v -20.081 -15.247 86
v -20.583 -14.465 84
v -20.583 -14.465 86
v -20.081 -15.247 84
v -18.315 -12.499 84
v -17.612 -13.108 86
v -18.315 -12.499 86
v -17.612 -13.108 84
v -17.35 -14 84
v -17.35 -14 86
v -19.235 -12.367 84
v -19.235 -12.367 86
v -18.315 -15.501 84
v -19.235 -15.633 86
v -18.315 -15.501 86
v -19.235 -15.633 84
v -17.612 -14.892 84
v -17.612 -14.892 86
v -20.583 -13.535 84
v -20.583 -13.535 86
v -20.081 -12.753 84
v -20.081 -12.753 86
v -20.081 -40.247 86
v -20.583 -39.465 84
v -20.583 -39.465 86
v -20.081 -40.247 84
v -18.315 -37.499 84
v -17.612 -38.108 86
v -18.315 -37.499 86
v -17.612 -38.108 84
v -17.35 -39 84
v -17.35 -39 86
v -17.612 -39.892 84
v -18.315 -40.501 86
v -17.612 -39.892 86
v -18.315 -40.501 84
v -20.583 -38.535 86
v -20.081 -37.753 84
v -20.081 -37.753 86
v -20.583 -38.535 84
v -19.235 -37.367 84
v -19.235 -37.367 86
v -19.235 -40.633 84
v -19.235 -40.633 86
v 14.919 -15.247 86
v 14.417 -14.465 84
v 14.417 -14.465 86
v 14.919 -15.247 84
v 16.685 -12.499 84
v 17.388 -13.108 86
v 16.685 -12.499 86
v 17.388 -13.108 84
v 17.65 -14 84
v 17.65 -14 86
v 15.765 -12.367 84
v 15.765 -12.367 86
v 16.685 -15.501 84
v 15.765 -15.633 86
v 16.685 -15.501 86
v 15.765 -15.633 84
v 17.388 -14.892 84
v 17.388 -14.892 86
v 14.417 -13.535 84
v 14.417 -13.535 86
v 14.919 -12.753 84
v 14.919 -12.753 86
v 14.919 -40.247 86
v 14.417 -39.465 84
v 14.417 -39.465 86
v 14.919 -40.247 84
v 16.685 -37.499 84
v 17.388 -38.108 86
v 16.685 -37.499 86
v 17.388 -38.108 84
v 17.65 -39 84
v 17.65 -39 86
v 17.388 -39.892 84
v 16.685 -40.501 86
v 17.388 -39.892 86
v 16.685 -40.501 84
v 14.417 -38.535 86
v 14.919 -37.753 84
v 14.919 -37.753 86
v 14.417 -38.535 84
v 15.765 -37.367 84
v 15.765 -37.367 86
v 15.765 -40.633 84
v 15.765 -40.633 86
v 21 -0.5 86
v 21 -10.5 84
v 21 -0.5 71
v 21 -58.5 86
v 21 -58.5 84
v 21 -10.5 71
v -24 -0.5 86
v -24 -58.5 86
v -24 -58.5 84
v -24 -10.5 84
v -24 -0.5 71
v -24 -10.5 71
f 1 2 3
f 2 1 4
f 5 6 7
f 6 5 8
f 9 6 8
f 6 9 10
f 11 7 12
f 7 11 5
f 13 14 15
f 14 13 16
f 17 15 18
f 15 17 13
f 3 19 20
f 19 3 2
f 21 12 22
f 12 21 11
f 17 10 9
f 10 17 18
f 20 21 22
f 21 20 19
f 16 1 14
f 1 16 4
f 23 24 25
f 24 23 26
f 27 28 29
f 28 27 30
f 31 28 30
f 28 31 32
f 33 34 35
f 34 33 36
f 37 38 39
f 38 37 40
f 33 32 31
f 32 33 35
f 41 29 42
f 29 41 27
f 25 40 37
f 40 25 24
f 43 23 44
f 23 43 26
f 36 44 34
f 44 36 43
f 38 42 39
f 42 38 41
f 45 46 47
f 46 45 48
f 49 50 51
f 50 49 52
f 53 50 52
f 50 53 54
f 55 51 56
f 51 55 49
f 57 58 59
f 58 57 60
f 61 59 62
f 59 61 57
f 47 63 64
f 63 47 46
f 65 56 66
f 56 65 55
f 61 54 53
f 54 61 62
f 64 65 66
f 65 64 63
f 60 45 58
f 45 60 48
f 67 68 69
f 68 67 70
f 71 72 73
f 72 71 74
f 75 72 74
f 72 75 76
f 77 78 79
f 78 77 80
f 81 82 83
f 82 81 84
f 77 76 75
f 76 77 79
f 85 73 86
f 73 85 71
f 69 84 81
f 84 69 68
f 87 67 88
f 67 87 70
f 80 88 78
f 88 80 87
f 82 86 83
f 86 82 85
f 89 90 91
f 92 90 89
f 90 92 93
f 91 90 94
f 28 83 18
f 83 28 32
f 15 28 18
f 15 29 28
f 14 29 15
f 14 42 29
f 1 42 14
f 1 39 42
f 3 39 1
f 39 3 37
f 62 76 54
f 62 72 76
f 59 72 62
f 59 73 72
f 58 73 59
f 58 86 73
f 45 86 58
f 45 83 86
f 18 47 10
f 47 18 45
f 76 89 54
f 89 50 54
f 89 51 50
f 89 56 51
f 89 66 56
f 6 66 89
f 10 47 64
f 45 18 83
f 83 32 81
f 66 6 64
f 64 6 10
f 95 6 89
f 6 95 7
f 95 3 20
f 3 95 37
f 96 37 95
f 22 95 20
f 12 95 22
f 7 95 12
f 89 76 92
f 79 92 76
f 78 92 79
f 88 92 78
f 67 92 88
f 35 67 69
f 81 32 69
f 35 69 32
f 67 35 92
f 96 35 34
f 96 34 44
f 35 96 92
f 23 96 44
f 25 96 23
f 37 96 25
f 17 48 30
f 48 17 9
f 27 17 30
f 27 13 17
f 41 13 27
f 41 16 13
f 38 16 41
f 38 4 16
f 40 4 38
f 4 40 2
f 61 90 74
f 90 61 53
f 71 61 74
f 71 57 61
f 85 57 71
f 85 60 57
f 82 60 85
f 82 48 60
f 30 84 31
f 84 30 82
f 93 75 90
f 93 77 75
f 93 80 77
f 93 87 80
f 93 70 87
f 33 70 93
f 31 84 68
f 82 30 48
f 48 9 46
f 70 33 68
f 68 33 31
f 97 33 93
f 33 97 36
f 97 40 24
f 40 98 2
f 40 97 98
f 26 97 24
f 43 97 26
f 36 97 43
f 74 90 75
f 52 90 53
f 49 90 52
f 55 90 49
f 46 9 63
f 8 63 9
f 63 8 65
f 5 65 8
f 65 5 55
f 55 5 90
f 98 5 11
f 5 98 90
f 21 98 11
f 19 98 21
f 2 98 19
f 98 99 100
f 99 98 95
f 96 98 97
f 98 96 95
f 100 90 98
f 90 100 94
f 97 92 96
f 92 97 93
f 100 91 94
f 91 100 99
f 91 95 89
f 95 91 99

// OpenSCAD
// file: ../external_modules/produced_at_the_workshop/produced_at_the_workshop.scad
module produced_at_the_workshop() {
    // Reto sent me this in an email to @physik.uzh.ch on 08.11.21.
    import("211108_produced_at_the_workshop.stl");
}
produced_at_the_workshop();
// main file
use <../external_modules/produced_at_the_workshop/produced_at_the_workshop.scad>

$fn = 11;

// Values taken from Igus datasheet ------
E1 = 19;
E2 = 25;
E3 = 35;
AL = 45;
LB = 6.5;
SG = 3;
D = 17;
NOT_IN_DATSHEET = 3.5;
// ---------------------------------------

COLOR_METAL_GRAY = .8*[1,1,1];

module MS0850505F065C1A() {
    // https://www.digikey.ch/en/products/detail/e-switch/MS0850505F065C1A/2720255
    color(.5*[1,1,1]) difference() {
        cube([19.8,6.4,10.6]);
        for (x = [0, 9.5]) {
            translate([x+5.15,6.4*(2-1/3),2.9]) rotate(a=90,v=[1,0,0]) cylinder(d=2.5,h=6.4*2);
        }
    }
    color(COLOR_METAL_GRAY) for (x = [0,8.8,8.8+7.3]) {
        translate([x+(19.8-8.8-7.3)/2-.6/2,(6.4-2.8)/2,-7.85]) cube([.6,2.8,7.85]);
    }
    for (pt = [0,3]) {
        translate([5.15+14.5,(6.4-2.8)/2,14.9+pt]) rotate(a=-90, v=[1,0,0]) cylinder(d=3,h=2.8);
    }
}

module MS0850505F065C1A_holder(draw_end_switch=false) {
    if (draw_end_switch) {
        translate([0,10,-22]) rotate(a=-90,v=[1,0,0]) rotate(a=-90,v=[0,0,1]) MS0850505F065C1A();
    }
    difference() {
        translate([0,-1,-25]) cube([11,18,20+5+10]);
        translate([-6,-8,-23]) cube([9,18,22]);
        translate([-6,-13,-23]) cube([13,18,22]);
        translate([0,10,-22]) rotate(a=-90,v=[1,0,0]) rotate(a=-90,v=[0,0,1]) minkowski() {
            MS0850505F065C1A();
            sphere(d=.5);
        }
    }
    difference() {
        translate([-33,-1,0]) cube([33,18,10]);
        for (i = [0,19]) {
            translate([-6.5-i,6.5,-1]) cylinder(d=3.5,h=10+2);
            translate([-6.5-i,6.5,10-3]) cylinder(d=9,h=4);
        }
    }
}

module piece_for_the_car() {
    difference() {
        translate([0,-E2-2*LB-10,0]) cube([AL,E2+2*LB+10,2]);
        translate([(AL-E3)/2,-NOT_IN_DATSHEET,-1]) for (ix=[0,1]) {
            for (iy=[0,1]) {
                translate([ix*E3,-iy*E2,0]) cylinder(d=SG*1.1,h=4);
            }
        }
    }
    translate([0,0,-15+2]) cube([AL,10,15]);
}

//translate([-3,-222-12,45]) MS0850505F065C1A_holder(
//    draw_end_switch = true
//);
//translate([-3,166-12+1,45]) mirror([0,1,0]) MS0850505F065C1A_holder(
//    draw_end_switch = false
//);

//color([.5,.5,1]) produced_at_the_workshop();
translate([-24,-10.5,84]) piece_for_the_car();
